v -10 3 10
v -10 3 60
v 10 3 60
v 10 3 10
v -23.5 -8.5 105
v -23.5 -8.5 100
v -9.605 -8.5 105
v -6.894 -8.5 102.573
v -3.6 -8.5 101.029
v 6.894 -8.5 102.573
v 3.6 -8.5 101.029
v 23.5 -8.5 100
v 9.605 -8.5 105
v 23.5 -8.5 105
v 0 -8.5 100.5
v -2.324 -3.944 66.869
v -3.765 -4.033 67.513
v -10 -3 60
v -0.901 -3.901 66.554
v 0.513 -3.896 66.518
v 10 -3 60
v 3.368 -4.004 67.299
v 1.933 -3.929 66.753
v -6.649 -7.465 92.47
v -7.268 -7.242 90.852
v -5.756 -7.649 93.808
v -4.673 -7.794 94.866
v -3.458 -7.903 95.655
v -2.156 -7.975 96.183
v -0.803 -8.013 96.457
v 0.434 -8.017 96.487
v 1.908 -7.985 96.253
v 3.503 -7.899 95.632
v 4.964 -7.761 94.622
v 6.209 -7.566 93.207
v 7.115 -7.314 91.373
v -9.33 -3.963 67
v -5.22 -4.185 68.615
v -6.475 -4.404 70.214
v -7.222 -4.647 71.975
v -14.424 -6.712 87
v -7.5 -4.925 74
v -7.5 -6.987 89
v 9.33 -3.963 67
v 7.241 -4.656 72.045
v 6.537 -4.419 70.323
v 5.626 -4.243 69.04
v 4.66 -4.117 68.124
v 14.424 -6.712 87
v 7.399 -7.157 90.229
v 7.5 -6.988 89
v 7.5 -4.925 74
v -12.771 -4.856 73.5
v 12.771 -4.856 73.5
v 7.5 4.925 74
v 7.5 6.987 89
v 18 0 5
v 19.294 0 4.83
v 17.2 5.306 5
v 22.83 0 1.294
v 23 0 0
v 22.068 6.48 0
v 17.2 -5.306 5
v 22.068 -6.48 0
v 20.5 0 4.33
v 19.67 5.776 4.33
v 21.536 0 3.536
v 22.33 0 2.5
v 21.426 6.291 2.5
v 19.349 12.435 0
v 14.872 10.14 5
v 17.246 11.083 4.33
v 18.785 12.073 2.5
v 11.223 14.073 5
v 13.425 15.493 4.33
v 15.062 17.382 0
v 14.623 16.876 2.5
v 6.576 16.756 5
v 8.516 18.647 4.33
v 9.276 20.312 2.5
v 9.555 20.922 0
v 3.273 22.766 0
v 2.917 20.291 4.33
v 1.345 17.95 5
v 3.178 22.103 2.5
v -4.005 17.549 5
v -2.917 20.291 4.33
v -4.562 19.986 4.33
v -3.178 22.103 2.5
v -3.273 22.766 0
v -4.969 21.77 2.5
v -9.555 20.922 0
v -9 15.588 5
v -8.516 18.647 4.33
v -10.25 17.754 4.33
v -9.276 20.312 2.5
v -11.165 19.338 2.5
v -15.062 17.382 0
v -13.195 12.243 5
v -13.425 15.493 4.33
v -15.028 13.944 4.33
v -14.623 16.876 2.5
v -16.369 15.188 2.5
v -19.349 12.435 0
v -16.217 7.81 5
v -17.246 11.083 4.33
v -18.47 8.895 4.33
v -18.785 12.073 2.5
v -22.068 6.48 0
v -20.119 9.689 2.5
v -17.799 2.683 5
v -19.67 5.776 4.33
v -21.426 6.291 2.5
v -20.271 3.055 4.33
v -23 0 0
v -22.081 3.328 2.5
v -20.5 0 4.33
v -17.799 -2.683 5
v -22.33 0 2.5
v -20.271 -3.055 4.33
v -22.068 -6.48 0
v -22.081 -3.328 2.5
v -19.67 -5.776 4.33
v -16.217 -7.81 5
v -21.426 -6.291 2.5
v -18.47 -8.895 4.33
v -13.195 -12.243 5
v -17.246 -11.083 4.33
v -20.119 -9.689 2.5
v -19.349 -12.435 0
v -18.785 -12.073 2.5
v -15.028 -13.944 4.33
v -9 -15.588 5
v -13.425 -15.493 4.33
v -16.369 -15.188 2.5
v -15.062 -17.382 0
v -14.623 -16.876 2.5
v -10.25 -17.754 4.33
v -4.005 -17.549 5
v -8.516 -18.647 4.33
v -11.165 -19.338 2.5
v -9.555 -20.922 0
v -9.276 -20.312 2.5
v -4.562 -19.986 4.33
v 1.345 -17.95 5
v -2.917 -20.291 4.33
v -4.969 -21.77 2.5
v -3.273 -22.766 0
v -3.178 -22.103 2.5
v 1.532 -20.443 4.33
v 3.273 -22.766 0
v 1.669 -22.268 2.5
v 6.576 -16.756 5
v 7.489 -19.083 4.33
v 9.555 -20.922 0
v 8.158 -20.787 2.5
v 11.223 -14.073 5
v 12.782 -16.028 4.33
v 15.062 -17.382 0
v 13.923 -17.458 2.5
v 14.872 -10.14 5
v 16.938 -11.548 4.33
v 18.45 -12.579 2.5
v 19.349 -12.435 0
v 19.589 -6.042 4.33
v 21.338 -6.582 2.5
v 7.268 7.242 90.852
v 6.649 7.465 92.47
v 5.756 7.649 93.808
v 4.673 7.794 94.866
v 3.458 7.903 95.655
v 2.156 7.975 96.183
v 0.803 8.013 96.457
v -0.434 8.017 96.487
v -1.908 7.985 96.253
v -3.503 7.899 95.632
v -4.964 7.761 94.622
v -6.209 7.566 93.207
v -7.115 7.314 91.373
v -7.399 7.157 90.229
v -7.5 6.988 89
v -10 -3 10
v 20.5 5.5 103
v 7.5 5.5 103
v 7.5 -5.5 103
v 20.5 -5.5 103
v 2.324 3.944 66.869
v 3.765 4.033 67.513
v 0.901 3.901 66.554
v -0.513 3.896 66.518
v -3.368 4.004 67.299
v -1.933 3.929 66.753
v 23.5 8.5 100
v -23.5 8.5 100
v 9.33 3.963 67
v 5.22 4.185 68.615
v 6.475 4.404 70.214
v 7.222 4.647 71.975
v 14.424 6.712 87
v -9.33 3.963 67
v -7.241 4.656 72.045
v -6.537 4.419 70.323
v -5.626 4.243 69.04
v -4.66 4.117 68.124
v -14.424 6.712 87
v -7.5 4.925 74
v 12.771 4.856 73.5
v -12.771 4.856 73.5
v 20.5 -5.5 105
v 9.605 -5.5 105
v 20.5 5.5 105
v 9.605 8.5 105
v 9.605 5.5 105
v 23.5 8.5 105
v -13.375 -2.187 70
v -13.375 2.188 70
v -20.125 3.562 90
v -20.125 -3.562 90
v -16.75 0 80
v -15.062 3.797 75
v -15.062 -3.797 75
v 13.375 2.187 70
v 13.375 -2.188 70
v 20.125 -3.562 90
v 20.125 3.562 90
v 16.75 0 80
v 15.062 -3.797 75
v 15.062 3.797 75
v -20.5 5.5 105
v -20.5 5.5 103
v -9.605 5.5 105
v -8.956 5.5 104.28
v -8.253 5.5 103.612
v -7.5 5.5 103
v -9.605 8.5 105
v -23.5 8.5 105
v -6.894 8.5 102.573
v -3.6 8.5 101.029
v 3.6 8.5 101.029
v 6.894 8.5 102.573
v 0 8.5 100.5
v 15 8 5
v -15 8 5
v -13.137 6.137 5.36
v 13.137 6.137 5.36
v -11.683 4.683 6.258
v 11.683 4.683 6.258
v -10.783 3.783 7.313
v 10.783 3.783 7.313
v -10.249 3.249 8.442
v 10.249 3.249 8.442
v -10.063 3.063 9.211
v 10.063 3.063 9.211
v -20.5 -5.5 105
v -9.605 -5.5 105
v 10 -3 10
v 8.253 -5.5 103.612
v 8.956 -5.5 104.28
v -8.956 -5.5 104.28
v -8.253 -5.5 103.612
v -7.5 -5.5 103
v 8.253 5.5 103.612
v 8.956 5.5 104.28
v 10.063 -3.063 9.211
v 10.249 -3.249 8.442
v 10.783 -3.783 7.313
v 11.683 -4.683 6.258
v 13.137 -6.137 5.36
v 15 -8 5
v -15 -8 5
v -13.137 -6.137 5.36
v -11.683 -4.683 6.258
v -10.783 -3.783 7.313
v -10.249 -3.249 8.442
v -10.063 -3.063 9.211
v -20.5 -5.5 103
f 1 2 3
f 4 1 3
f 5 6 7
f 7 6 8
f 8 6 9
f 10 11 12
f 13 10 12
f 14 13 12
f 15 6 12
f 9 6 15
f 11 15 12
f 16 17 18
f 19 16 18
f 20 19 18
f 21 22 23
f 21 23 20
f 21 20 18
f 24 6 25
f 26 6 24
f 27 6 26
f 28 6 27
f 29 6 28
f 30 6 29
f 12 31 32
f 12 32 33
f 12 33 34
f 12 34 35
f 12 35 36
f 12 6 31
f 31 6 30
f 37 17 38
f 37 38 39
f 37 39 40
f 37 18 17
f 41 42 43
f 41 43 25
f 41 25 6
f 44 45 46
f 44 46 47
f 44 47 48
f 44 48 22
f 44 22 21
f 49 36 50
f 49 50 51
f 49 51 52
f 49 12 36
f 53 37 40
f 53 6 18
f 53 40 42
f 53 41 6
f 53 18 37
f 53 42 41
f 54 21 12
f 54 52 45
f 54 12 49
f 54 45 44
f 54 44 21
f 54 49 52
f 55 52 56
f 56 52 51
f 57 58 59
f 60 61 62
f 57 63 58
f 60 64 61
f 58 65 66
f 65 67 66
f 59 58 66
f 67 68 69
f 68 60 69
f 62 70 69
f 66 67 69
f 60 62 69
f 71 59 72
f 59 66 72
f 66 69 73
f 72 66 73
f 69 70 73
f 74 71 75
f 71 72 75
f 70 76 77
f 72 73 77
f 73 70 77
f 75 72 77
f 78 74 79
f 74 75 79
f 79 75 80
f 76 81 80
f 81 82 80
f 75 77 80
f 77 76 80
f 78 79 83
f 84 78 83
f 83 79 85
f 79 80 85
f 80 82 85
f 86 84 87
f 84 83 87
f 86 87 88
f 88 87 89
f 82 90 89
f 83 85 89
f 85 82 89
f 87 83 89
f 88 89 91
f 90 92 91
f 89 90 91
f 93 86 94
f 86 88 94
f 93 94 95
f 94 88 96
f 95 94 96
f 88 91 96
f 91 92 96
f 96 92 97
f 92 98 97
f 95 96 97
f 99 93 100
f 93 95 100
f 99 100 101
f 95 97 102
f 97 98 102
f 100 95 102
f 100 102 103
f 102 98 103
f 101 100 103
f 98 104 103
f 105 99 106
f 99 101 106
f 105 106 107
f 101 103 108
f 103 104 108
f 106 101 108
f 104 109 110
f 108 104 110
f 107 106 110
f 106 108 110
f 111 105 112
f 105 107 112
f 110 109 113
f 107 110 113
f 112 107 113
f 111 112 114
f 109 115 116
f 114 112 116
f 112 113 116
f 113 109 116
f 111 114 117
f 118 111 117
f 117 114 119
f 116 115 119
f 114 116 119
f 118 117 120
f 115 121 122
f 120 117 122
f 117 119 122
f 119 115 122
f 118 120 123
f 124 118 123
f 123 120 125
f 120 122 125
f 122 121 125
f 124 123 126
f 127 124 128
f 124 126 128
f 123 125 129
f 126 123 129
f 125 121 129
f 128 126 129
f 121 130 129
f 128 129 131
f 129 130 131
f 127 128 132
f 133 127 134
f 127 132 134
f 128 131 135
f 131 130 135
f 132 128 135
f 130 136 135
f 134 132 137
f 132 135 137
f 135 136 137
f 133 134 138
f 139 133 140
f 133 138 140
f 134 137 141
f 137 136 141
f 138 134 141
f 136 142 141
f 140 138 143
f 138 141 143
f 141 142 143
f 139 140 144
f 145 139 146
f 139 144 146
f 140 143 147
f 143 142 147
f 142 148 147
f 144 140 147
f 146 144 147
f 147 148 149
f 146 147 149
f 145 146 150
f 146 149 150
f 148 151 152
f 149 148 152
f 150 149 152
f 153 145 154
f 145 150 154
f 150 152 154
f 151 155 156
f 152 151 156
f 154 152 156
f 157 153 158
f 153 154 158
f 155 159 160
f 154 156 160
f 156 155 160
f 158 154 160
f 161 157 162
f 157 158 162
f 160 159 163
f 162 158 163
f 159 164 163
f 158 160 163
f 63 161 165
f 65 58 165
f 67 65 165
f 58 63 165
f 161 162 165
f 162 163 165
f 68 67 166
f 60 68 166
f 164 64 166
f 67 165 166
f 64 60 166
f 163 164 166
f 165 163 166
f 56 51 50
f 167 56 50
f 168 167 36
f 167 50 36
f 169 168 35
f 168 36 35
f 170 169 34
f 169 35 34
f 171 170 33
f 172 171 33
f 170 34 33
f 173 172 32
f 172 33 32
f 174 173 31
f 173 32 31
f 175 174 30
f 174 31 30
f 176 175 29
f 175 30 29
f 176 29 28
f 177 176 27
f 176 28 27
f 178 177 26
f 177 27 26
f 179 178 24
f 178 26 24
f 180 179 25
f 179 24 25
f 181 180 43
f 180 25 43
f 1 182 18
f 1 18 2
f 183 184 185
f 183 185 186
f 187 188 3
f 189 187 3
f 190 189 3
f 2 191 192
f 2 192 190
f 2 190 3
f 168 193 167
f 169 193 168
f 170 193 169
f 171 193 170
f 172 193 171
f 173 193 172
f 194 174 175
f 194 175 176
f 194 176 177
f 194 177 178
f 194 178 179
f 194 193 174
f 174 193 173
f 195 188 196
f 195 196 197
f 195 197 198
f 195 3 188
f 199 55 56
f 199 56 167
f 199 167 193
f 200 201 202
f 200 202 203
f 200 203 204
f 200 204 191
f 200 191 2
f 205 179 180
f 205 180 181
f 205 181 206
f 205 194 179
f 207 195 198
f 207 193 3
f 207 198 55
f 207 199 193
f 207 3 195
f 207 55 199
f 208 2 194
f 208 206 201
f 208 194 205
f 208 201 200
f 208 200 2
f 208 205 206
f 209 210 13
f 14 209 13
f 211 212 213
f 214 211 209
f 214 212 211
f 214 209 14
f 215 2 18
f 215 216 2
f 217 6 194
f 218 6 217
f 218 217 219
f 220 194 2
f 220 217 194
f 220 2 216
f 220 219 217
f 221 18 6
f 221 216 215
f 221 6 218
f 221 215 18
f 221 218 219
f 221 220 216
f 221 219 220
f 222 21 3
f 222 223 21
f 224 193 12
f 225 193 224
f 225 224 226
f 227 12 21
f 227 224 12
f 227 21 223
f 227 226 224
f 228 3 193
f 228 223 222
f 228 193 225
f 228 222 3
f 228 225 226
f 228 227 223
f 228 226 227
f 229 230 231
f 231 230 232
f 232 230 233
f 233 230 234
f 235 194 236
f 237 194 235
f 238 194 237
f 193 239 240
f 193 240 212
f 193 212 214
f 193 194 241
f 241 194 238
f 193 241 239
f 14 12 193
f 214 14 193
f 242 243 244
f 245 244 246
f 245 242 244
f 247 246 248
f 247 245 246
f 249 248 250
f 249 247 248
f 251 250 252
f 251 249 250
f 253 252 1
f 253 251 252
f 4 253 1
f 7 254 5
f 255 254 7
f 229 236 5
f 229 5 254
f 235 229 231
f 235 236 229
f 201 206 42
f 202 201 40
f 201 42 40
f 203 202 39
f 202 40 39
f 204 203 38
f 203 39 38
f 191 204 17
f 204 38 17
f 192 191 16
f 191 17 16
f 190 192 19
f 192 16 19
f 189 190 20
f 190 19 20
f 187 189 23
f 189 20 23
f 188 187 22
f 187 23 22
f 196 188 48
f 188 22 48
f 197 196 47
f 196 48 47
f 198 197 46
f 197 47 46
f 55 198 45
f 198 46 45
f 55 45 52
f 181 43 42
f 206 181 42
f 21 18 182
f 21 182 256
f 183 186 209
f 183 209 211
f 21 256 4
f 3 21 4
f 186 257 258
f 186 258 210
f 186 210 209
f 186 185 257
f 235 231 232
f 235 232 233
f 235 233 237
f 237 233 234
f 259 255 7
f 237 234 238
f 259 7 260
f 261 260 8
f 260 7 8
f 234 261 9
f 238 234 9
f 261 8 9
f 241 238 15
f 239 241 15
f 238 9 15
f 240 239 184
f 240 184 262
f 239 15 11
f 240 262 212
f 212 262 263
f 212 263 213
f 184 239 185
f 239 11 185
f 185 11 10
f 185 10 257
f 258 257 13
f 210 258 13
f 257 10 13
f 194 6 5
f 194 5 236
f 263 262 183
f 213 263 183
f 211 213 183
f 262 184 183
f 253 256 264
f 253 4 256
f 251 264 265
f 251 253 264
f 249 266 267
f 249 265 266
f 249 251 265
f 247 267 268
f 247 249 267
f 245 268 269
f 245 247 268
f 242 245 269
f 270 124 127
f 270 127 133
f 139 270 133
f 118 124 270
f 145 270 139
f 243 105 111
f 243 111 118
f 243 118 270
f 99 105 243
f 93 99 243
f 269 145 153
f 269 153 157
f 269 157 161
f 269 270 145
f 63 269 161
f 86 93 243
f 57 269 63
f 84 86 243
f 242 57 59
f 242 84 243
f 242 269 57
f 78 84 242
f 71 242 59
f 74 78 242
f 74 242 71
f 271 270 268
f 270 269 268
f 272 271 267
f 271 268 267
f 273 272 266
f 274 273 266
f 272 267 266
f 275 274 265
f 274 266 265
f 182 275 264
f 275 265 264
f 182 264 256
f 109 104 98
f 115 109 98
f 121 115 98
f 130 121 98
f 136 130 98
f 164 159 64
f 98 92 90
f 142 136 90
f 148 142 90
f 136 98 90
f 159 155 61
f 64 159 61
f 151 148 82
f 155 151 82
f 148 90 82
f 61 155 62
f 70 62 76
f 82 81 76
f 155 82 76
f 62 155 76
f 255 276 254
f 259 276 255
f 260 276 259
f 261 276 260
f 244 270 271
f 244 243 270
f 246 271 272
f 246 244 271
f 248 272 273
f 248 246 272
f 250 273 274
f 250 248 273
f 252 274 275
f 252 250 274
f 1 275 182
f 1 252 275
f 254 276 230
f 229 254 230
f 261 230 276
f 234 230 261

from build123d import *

# Parameters (mm, degrees)
F1_W       = 41
F1_H       = 11
F2_DEPTH   = 3
F1_W_2     = 47
F1_H_2     = 17
F3_DEPTH   = 5
F5_DEPTH   = 17.001
F6_R       = 23
F7_DEPTH   = 5
F8_W       = 20
F8_H       = 6
F9_DEPTH   = 55
F9_FACE_W  = 20
F9_FACE_H  = 6
F3_FACE1_W = 47
F3_FACE1_H = 17
F12_DEPTH  = 25
F13_R      = 4.99999


# Not quite as in the source:
# - a fillet or chamfer is up to 0.001 mm smaller than in the source, because OpenCascade refuses the exact size


with BuildPart() as f2:
    # F1 (on offset) → F2 (new body)
    with BuildSketch(Plane.XY.offset(100)):
        Rectangle(F1_W, F1_H)
    extrude(amount=F2_DEPTH)

    # F1 (on offset) → F3 (join)
    with BuildSketch(Plane.XY.offset(100)):
        Rectangle(F1_W_2, F1_H_2)
        Rectangle(F1_W, F1_H, mode=Mode.SUBTRACT)
    extrude(amount=F3_DEPTH)

    # F4 (on face) → F5 (cut, through all)
    with BuildSketch(Plane.XZ.offset(8.5)):
        with BuildLine():
            Line((9.6046863561, 105), (-9.6046863561, 105))
            ThreePointArc((-9.6046863561, 105), (0, 100.5), (9.6046863561, 105))
        make_face()
    extrude(amount=-F5_DEPTH, mode=Mode.SUBTRACT)



with BuildPart() as f7:
    # F6 (on Top) → F7 (new body)
    with BuildSketch(Plane.XY):
        Circle(F6_R)
    extrude(amount=F7_DEPTH)

    # F8 (on face) → F9 (join)
    with BuildSketch(Plane.XY.offset(5)):
        Rectangle(F8_W, F8_H)
    extrude(amount=F9_DEPTH)


with BuildPart() as f2_1:
    add(f2.part)

    add(f7.part)  # F10 merges F7
    # F9_face (on face) → F10 section 0
    with BuildSketch(Plane.XY.offset(60)):
        Rectangle(F9_FACE_W, F9_FACE_H)
    # F3_face1 (on face) → F10 section 1
    with BuildSketch(Plane(origin=(0, 0, 100), x_dir=(1, 0, 0), z_dir=(0, 0, -1))):
        Rectangle(F3_FACE1_W, F3_FACE1_H)
    loft()

    # F11 (on Front) → F12 (cut, symmetric)
    with BuildSketch(Plane.XZ):
        with BuildLine():
            ThreePointArc((7.5, 89), (0, 96.5), (-7.5, 89))
            Line((-7.5, 89), (-7.5, 74))
            ThreePointArc((-7.5, 74), (0, 66.5), (7.5, 74))
            Line((7.5, 74), (7.5, 89))
        make_face()
    extrude(amount=F12_DEPTH, both=True, mode=Mode.SUBTRACT)

    # F13 (radius 5 in the source; OpenCascade refuses exactly that, so slightly less here)
    f13_edges = [f2_1.edges().sort_by_distance(p)[0] for p in [
        (0, -3, 5),
        (-10, 0, 5),
        (0, 3, 5),
        (10, 0, 5),
        (-23, 0, 5),
    ]]
    fillet(f13_edges, radius=F13_R)


solid = f2_1.part
